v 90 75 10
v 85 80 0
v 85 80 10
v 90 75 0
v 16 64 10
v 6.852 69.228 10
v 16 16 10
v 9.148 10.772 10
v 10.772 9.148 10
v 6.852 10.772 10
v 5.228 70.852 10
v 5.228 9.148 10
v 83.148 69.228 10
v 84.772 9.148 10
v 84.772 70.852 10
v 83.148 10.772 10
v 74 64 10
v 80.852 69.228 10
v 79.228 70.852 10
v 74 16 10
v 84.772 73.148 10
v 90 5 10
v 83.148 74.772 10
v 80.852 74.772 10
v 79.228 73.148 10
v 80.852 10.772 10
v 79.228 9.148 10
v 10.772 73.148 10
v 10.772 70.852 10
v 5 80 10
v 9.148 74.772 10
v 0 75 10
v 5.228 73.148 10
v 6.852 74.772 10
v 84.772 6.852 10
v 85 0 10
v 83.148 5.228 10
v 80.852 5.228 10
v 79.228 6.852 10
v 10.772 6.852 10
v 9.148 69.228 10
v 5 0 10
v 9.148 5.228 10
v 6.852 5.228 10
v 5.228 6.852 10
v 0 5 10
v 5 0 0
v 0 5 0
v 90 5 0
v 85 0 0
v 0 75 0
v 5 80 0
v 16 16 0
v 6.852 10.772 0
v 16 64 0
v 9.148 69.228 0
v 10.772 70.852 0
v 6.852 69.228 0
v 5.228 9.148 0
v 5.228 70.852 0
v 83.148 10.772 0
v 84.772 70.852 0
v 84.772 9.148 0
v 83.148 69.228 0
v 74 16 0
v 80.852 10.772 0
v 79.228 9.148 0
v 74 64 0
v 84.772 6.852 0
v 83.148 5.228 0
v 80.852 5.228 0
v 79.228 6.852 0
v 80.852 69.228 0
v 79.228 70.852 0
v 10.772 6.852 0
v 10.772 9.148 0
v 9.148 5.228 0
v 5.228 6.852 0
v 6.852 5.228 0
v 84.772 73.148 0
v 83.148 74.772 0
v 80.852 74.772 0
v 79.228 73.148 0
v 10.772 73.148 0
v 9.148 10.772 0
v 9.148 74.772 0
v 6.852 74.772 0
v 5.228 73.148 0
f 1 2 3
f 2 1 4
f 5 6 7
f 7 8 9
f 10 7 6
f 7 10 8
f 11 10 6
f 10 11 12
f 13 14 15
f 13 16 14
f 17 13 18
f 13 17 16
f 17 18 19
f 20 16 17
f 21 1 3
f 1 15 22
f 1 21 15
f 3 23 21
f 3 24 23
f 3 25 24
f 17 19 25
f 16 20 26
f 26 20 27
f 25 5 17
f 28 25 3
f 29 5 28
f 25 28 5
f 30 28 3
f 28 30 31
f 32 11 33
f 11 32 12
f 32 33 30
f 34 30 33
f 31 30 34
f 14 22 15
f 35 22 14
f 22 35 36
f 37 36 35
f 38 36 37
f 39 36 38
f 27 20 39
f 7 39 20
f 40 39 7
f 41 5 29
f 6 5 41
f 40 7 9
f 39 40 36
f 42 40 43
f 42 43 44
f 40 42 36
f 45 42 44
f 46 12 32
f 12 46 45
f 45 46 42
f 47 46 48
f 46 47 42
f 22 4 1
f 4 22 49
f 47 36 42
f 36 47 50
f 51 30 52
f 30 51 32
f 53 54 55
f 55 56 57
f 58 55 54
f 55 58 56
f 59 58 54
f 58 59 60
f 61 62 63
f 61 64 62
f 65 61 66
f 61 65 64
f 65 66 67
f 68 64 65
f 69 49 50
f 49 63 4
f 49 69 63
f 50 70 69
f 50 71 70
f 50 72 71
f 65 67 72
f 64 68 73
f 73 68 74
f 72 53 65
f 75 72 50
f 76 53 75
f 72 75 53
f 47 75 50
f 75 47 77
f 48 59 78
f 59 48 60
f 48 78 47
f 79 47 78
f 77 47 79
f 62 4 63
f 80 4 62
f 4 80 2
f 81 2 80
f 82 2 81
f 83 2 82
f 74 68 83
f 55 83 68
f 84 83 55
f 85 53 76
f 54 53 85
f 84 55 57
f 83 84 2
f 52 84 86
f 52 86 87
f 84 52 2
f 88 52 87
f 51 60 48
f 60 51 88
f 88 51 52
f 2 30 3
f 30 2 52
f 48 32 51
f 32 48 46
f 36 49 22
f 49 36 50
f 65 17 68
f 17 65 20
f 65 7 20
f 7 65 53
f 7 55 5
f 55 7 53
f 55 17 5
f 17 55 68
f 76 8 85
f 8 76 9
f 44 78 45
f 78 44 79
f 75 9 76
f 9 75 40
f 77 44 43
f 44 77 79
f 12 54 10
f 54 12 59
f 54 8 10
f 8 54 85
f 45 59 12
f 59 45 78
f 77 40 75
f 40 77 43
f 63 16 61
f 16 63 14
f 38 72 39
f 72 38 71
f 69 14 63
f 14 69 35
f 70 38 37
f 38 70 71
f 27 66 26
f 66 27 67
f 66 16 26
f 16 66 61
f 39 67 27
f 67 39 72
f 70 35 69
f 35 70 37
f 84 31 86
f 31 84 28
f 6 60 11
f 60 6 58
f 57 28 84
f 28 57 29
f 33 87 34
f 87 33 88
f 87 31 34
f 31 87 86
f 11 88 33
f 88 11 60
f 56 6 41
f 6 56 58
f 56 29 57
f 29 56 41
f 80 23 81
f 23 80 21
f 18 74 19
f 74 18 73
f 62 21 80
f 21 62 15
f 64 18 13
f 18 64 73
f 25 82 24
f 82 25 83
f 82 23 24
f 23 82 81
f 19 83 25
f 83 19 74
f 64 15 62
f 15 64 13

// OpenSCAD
$fn = 32;

// ----------------------------------------------------------------------
// Frame plate: 90 x 80 frame, 16 mm rails
// ----------------------------------------------------------------------

// --- parameters (mm) ---
plate_l = 90;             // plate length, X
plate_w = 80;             // plate width, Y
plate_t = 10;             // plate thickness, Z (extrusion height)
corner_c = 5;             // corner chamfer
frame_bar = 16;           // frame rail width
bolt_r = 3;               // corner bolt window radius
bolt_inset = 8;           // bolt centre inset from the edges
fit_tol = 0.05;           // declared fit tolerance (prompt contract)
free_tol = 0.3;           // declared free tolerance (prompt contract)

win_l = plate_l - 2 * frame_bar;  // window length
win_w = plate_w - 2 * frame_bar;  // window width
bolt_d = 2 * bolt_r;  // corner hole diameter

profile = [[5, 0], [85, 0], [90, 5], [90, 75], [85, 80], [5, 80], [0, 75], [0, 5]];  // primary outline, 8 points, counter clockwise
void_1 = [[16, 16], [74, 16], [74, 64], [16, 64]];  // the window, 4 points
void_2 = [[10.772, 9.148], [9.148, 10.772], [6.852, 10.772], [5.228, 9.148], [5.228, 6.852], [6.852, 5.228], [9.148, 5.228], [10.772, 6.852]];  // corner bolt window, 8 points
void_3 = [[84.772, 9.148], [83.148, 10.772], [80.852, 10.772], [79.228, 9.148], [79.228, 6.852], [80.852, 5.228], [83.148, 5.228], [84.772, 6.852]];  // corner bolt window, 8 points
void_4 = [[10.772, 73.148], [9.148, 74.772], [6.852, 74.772], [5.228, 73.148], [5.228, 70.852], [6.852, 69.228], [9.148, 69.228], [10.772, 70.852]];  // corner bolt window, 8 points
void_5 = [[84.772, 73.148], [83.148, 74.772], [80.852, 74.772], [79.228, 73.148], [79.228, 70.852], [80.852, 69.228], [83.148, 69.228], [84.772, 70.852]];  // corner bolt window, 8 points

// --- the one profile operation ---
difference() {
  linear_extrude(height = plate_t) polygon(points = profile);
  translate([0, 0, -1])
    linear_extrude(height = plate_t + 2) polygon(points = void_1);
  translate([0, 0, -1])
    linear_extrude(height = plate_t + 2) polygon(points = void_2);
  translate([0, 0, -1])
    linear_extrude(height = plate_t + 2) polygon(points = void_3);
  translate([0, 0, -1])
    linear_extrude(height = plate_t + 2) polygon(points = void_4);
  translate([0, 0, -1])
    linear_extrude(height = plate_t + 2) polygon(points = void_5);
}
